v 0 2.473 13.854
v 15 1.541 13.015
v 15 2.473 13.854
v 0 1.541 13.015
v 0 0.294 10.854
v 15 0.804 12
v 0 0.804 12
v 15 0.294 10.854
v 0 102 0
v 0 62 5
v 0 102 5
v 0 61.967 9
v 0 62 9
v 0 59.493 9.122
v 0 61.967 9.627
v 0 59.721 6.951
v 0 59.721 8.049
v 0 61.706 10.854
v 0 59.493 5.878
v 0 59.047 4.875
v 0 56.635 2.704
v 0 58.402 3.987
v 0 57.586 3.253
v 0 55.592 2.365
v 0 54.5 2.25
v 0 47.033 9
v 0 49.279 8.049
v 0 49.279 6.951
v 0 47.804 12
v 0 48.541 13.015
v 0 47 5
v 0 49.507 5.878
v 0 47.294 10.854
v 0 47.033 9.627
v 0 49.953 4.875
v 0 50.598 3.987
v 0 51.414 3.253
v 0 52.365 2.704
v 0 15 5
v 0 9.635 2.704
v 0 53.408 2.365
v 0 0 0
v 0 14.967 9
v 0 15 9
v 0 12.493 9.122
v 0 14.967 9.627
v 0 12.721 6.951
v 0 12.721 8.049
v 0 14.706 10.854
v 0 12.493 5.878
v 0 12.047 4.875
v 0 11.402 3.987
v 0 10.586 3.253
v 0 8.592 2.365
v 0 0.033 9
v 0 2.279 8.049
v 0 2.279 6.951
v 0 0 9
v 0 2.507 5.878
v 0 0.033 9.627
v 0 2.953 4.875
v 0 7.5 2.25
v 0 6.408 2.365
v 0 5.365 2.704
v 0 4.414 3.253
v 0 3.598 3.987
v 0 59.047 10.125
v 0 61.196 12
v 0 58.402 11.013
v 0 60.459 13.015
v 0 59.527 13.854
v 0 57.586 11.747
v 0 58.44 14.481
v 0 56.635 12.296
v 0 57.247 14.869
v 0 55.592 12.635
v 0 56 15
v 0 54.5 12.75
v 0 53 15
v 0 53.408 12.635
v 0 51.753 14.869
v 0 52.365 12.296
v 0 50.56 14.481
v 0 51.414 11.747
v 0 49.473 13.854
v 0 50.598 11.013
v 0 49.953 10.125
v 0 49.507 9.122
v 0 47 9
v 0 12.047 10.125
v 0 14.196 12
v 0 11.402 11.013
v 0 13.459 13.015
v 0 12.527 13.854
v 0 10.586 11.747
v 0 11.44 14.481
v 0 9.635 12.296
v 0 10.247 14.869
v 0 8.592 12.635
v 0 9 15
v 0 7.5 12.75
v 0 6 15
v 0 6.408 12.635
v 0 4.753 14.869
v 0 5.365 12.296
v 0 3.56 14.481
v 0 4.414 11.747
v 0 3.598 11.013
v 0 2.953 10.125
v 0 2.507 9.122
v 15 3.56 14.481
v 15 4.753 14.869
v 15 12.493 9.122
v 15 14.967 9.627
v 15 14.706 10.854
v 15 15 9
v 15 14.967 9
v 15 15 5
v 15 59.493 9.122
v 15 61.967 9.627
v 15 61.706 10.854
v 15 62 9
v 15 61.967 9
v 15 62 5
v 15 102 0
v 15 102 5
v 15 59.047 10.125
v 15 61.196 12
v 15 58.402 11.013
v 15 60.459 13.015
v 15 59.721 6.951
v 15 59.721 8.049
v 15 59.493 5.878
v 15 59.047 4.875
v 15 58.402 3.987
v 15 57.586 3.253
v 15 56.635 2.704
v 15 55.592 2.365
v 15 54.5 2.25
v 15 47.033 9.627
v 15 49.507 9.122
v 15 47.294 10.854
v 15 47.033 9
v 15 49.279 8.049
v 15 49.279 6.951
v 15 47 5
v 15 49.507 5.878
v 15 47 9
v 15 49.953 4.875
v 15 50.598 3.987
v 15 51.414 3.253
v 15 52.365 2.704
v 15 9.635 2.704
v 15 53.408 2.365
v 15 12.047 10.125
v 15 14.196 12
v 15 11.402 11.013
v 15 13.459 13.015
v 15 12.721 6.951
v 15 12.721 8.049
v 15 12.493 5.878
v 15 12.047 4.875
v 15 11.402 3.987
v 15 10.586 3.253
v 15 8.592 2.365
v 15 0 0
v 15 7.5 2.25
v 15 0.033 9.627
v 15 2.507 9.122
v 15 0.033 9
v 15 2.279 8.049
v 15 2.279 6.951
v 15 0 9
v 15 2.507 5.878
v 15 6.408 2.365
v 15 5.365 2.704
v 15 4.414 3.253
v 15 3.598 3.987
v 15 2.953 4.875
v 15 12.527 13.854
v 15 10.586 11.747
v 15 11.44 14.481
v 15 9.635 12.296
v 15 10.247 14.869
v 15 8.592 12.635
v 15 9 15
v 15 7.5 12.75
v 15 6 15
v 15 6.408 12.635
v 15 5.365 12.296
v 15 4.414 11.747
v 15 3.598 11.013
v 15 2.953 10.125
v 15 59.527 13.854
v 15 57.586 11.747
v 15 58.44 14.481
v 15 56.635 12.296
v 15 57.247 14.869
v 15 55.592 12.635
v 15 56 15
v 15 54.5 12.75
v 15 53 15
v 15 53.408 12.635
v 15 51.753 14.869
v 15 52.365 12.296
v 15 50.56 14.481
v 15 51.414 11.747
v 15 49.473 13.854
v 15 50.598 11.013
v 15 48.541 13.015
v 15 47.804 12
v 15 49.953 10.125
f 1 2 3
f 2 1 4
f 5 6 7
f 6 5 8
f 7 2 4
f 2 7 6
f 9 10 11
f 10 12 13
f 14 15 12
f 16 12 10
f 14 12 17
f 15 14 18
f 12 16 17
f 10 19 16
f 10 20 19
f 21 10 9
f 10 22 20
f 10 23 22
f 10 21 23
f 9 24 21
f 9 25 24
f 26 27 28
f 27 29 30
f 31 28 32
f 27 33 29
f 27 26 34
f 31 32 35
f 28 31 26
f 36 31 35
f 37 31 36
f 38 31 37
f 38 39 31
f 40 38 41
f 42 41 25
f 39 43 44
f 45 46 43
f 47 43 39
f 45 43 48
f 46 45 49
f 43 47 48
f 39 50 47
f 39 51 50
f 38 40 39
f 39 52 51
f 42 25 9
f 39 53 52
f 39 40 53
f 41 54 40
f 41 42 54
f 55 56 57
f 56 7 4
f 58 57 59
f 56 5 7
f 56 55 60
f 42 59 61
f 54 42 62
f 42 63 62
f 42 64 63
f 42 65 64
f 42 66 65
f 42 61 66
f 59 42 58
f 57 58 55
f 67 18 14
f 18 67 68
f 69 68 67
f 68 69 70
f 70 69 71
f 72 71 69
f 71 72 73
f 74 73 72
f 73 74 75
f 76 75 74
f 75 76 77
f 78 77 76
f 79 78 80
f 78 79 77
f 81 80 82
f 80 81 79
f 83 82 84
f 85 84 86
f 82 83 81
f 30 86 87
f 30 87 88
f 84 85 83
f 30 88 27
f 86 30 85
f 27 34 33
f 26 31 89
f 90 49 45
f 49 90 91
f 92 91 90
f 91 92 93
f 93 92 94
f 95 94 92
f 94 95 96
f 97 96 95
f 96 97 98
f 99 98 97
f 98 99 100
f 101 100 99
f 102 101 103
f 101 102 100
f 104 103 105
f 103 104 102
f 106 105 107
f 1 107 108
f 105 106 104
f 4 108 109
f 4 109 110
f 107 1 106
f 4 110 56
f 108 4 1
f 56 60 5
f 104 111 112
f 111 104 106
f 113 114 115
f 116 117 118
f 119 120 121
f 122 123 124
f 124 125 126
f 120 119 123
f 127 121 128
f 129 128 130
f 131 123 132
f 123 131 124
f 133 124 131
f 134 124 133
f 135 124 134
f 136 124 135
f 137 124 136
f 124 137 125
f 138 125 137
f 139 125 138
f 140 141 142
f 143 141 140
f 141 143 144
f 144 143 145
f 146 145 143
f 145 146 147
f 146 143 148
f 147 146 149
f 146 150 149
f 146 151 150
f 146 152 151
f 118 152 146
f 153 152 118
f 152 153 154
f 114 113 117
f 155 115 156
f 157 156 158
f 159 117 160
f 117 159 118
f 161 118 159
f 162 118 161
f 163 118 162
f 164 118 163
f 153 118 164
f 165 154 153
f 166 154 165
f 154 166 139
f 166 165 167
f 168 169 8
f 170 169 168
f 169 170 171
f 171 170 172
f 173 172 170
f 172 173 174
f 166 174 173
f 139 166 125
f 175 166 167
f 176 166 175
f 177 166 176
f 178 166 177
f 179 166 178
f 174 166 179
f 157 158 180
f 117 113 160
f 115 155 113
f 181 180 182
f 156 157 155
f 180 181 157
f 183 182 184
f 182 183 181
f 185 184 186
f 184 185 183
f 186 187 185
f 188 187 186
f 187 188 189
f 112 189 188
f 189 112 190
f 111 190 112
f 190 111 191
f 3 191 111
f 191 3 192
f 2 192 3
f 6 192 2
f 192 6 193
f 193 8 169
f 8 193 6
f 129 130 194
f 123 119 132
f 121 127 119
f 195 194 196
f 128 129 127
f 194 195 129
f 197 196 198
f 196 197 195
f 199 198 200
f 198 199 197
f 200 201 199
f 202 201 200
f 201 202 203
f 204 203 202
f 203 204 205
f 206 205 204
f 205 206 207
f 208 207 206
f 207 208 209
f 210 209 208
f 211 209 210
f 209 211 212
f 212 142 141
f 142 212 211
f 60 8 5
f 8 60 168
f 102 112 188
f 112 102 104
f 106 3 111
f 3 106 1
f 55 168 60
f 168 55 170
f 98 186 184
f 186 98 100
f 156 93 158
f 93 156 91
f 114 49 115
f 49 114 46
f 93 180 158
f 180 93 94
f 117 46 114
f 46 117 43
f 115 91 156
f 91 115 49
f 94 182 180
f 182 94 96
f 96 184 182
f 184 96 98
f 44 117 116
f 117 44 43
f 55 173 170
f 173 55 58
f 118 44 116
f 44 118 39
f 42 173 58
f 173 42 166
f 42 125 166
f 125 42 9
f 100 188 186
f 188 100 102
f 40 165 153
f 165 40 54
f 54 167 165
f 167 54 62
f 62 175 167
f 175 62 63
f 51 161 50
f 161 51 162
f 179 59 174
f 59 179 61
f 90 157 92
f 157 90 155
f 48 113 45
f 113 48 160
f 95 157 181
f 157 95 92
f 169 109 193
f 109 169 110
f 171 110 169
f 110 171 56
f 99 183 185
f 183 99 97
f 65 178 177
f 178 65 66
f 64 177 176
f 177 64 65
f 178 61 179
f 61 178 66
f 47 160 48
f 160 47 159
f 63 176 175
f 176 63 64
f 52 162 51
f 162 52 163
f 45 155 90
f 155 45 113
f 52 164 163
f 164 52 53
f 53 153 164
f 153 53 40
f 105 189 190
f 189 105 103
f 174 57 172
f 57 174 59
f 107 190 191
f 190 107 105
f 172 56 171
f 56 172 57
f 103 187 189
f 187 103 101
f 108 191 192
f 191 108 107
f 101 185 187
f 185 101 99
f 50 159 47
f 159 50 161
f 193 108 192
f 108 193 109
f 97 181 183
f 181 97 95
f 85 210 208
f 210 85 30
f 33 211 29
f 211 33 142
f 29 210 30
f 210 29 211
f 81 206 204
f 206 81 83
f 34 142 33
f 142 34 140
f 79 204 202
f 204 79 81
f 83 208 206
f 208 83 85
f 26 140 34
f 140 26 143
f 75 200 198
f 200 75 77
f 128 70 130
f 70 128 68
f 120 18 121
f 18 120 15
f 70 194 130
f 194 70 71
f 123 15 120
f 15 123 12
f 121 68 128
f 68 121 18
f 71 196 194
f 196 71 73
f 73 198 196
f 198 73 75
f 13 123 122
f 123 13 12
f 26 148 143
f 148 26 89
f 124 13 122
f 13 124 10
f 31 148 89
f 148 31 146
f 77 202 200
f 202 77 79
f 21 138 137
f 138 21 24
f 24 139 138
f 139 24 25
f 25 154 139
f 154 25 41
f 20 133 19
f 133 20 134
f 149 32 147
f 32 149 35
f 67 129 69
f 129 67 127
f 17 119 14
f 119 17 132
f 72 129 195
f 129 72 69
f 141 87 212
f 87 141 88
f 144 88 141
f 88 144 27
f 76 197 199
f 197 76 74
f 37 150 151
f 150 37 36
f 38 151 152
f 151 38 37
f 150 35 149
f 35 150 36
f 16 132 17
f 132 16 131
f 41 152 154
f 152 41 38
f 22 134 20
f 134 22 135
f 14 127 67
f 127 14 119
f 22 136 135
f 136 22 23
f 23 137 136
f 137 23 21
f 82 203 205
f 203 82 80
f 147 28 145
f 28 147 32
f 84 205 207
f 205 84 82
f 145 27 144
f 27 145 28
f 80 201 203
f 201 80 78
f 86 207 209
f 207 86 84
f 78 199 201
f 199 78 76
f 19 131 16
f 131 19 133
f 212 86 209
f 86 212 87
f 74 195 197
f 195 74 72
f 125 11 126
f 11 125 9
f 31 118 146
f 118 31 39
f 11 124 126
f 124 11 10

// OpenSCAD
echo(version=version());
use <MCAD/boxes.scad>

// Values are in millimeters

$fs=0.5;
////////////////////////////

extruder_width = 0.4;

width=15;

module bump() {
	difference() {
		roundedBox([15, 15, width], 6, true);
		translate([0, 0, -16/2]) cylinder(h = 16, d = 10.5);
	}
}


original_base=62;
extenstion=40;

cube([width, original_base + extenstion, 2]);
translate([width/2, 15/2, 15/2]) rotate([0, 90, 0]) bump();
translate([width/2, original_base - 15 + 15/2, 15/2]) rotate([0, 90, 0]) bump();
translate([0,0,2]) cube([width, 2, 4]);
translate([0,13,2]) cube([width, 2, 4]);
translate([0,47,2]) cube([width, 2, 4]);
translate([0,60,2]) cube([width, 2, 4]);

translate([0,15,0]) cube([width, original_base - 30, 5]);
translate([0, original_base, 0]) cube([width, extenstion, 5]);
